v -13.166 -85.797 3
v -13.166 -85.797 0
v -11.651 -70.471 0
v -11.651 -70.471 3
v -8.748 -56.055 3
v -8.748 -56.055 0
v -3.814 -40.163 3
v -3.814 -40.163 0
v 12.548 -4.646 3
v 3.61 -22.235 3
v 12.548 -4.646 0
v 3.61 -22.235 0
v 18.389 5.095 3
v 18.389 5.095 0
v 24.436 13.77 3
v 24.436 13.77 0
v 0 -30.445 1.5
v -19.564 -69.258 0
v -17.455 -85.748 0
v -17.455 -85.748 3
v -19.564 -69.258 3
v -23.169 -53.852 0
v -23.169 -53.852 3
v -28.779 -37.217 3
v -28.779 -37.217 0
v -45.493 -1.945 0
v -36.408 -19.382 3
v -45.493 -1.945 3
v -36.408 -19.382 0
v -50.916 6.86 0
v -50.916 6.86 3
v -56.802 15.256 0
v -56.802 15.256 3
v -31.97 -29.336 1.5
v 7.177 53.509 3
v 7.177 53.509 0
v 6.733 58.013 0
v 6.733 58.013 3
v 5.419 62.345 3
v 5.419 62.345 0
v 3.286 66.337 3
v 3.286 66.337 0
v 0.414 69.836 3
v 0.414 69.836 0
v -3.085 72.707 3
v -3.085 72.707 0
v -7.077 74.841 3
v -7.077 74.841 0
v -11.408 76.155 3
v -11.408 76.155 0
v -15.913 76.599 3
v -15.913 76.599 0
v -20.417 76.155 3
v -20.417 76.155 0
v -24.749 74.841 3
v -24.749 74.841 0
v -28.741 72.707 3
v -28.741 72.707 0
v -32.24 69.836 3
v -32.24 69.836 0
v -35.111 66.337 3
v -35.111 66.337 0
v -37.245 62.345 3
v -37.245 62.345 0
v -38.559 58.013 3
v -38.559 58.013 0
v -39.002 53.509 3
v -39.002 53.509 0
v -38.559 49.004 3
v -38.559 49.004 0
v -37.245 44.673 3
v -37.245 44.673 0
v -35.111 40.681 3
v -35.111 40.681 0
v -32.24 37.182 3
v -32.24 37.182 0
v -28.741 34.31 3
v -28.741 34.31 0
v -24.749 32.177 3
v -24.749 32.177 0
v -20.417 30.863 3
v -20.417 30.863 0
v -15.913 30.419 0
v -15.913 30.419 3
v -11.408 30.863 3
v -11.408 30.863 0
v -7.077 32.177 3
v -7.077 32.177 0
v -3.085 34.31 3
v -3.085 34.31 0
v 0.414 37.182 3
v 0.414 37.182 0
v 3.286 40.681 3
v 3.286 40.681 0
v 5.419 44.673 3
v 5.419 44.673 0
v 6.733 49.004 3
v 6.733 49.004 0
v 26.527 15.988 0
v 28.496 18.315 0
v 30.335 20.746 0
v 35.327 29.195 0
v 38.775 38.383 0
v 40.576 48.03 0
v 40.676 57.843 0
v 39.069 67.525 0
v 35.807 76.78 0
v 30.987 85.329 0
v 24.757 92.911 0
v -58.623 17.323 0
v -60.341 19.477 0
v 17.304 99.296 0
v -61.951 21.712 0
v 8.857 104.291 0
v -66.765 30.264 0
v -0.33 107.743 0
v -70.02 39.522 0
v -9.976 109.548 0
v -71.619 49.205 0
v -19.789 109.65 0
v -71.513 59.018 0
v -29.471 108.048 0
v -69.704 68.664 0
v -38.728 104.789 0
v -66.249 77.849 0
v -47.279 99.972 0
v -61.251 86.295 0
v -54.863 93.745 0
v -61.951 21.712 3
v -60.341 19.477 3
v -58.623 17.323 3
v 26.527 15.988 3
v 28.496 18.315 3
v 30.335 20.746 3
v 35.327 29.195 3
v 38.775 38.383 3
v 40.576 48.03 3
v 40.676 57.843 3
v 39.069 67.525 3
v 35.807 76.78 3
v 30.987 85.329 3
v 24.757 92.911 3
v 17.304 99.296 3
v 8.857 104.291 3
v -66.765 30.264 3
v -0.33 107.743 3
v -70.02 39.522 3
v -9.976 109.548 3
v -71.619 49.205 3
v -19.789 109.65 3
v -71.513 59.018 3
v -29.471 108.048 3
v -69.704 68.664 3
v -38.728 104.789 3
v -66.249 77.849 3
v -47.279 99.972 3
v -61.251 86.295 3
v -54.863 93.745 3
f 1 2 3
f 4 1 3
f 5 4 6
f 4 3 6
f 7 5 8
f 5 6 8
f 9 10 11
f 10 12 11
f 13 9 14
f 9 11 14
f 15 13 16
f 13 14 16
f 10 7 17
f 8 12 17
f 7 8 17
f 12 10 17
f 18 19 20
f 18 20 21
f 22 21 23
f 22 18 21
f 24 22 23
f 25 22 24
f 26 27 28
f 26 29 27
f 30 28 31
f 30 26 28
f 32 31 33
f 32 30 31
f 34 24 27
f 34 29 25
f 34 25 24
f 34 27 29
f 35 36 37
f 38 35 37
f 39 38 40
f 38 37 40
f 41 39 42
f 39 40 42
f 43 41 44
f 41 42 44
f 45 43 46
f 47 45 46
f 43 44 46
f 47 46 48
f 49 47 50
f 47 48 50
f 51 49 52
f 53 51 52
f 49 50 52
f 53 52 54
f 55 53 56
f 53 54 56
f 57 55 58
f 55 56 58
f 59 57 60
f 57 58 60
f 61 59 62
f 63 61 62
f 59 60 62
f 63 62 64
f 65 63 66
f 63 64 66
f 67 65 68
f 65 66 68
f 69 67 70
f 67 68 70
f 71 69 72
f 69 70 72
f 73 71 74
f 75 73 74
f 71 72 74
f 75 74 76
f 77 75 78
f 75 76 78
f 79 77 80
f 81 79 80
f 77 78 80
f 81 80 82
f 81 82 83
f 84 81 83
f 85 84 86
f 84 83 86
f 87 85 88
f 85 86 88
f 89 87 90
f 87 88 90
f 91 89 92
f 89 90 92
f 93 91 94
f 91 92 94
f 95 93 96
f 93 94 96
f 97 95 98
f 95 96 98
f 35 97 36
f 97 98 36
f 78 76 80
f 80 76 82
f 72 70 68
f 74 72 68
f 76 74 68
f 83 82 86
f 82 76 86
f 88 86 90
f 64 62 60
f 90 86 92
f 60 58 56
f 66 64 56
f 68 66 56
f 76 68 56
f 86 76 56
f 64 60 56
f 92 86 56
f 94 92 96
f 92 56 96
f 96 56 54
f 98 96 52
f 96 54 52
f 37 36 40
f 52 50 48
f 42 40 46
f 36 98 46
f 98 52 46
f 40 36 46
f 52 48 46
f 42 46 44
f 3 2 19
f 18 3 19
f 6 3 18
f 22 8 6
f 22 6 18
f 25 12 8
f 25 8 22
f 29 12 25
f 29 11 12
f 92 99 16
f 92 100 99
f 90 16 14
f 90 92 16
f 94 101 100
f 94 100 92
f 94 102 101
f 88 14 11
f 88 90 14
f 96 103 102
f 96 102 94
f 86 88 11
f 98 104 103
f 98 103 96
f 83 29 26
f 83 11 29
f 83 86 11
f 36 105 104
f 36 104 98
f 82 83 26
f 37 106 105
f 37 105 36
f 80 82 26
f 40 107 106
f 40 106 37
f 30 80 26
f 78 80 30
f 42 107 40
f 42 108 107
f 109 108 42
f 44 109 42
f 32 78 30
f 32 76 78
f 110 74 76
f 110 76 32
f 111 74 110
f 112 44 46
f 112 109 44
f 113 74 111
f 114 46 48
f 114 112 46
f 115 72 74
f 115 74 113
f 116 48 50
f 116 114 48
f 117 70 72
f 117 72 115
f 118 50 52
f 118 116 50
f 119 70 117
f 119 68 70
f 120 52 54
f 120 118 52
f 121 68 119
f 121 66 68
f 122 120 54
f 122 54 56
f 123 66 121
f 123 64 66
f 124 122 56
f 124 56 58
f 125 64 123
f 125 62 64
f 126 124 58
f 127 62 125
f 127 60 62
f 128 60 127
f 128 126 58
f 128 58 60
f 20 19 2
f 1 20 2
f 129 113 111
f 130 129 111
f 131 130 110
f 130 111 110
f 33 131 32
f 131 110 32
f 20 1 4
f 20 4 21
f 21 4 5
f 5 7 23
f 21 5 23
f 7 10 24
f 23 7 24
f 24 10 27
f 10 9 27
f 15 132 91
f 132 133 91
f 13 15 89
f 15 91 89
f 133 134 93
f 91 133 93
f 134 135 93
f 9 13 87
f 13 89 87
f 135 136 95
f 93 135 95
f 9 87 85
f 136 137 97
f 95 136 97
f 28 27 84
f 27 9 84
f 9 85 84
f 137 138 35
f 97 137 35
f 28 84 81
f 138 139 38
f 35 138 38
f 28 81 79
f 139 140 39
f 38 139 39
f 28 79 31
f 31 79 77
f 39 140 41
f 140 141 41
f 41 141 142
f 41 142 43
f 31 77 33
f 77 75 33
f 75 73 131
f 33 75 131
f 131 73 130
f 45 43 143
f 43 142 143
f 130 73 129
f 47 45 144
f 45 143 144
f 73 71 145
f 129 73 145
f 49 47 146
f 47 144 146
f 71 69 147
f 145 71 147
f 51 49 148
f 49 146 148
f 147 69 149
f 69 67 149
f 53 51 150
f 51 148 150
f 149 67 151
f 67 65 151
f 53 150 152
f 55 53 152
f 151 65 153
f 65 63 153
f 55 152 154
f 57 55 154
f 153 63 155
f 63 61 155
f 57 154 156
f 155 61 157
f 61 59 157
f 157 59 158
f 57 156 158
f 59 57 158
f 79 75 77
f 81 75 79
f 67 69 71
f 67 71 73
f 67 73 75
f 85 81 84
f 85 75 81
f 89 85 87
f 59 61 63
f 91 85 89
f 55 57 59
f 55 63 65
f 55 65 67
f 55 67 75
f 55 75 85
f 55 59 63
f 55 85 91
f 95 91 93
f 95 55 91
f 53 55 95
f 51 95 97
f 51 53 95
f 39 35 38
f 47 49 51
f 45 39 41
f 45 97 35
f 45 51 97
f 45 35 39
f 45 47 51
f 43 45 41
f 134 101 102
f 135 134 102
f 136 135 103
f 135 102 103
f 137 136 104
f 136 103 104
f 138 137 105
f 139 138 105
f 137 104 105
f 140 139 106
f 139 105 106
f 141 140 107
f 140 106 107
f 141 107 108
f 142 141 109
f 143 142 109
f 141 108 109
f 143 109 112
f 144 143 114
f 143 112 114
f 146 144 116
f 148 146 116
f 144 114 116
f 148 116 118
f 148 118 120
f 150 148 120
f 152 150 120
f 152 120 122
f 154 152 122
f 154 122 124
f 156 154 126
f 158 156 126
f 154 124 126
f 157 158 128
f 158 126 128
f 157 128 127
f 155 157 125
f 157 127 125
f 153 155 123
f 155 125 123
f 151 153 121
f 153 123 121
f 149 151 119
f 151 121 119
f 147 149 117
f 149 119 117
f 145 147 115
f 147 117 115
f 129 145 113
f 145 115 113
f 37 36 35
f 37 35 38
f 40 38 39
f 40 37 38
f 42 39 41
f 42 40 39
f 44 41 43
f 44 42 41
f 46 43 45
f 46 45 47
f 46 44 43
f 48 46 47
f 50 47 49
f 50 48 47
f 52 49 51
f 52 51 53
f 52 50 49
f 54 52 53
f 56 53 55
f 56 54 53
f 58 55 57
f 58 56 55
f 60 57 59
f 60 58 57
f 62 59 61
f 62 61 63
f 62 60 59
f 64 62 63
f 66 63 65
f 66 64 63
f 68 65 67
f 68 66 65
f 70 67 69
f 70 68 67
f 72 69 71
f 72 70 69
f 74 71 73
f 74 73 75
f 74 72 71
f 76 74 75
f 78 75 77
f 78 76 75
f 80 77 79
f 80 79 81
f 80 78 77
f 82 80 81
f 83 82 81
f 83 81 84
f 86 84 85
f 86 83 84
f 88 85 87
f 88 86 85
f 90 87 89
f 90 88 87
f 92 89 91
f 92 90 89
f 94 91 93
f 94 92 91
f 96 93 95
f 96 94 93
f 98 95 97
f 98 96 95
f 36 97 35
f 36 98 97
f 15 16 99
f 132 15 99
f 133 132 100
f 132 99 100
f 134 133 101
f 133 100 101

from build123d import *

# Parameters (mm, degrees)
F2_R     = 23.0897028216
F3_DEPTH = 3
F0_R     = 23.0897028216
F4_DEPTH = 3


# Not quite as in the source:
# - the dataset's text gives a spline's control points without its knots; the knots are read off the source's solid


with BuildPart() as f3:
    # F2 (on face) → F3 (new body)
    with BuildSketch(Plane.XY):
        with BuildLine():
            add(Edge.make_bspline(
                [(24.4357683195, 13.7704961499), (26.4004851942, 16.3478745215), (28.3743311543, 18.6940959772), (30.3351804614, 20.7458790392)],
                knots=[0.9099263798, 0.9099263798, 0.9099263798, 0.9099263798, 1, 1, 1, 1], degree=3))
            ThreePointArc((24.4357683195, 13.7704961499), (27.527158464, 17.1383586537), (30.3351804614, 20.7458790392))
        make_face()
        with BuildLine():
            add(Edge.make_bspline(
                [(-13.1657877937, -85.7971683145), (-12.124221772, -65.5360594392), (-4.0500259711, -34.9286832493), (15.3721634866, 1.8805697355), (24.4357683195, 13.7704961499)],
                knots=[0, 0, 0, 0, 0.4943999951, 0.9099263798, 0.9099263798, 0.9099263798, 0.9099263798], degree=3))
            add(Edge.make_bspline(
                [(24.4357683195, 13.7704961499), (26.4004851942, 16.3478745215), (28.3743311543, 18.6940959772), (30.3351804614, 20.7458790392)],
                knots=[0.9099263798, 0.9099263798, 0.9099263798, 0.9099263798, 1, 1, 1, 1], degree=3))
            ThreePointArc((30.3351804614, 20.7458790392), (-14.8805945591, 109.8132814972), (-61.9512721896, 21.7120908201))
            add(Edge.make_bspline(
                [(-56.8019096606, 15.2559147606), (-58.4646697135, 17.4695314371), (-60.1806042841, 19.6250655082), (-61.9512721896, 21.7120908201)],
                knots=[0.9292469814, 0.9292469814, 0.9292469814, 0.9292469814, 1, 1, 1, 1], degree=3))
            add(Edge.make_bspline(
                [(-17.4547079951, -85.7477933168), (-19.0374422117, -64.7392000389), (-29.0853821507, -31.9599274574), (-46.6665856361, 1.7628540852), (-56.8019096606, 15.2559147606)],
                knots=[0, 0, 0, 0, 0.497973228, 0.9292469814, 0.9292469814, 0.9292469814, 0.9292469814], degree=3))
            Line((-17.4547079951, -85.7477933168), (-13.1657877937, -85.7971683145))
        make_face()
        with Locations((-15.9126216176, 53.508865199)):
            Circle(F2_R, mode=Mode.SUBTRACT)
        with BuildLine():
            add(Edge.make_bspline(
                [(-56.8019096606, 15.2559147606), (-58.4646697135, 17.4695314371), (-60.1806042841, 19.6250655082), (-61.9512721896, 21.7120908201)],
                knots=[0.9292469814, 0.9292469814, 0.9292469814, 0.9292469814, 1, 1, 1, 1], degree=3))
            ThreePointArc((-61.9512721896, 21.7120908201), (-59.4950986731, 18.3894825431), (-56.8019096606, 15.2559147606))
        make_face()
    extrude(amount=F3_DEPTH)


with BuildPart() as f4:
    # F0 (on Top) → F4 (new body)
    with BuildSketch(Plane.XY):
        with Locations((-15.9126216176, 53.508865199)):
            Circle(F0_R)
    extrude(amount=F4_DEPTH)


solid = Compound([f3.part, f4.part])
